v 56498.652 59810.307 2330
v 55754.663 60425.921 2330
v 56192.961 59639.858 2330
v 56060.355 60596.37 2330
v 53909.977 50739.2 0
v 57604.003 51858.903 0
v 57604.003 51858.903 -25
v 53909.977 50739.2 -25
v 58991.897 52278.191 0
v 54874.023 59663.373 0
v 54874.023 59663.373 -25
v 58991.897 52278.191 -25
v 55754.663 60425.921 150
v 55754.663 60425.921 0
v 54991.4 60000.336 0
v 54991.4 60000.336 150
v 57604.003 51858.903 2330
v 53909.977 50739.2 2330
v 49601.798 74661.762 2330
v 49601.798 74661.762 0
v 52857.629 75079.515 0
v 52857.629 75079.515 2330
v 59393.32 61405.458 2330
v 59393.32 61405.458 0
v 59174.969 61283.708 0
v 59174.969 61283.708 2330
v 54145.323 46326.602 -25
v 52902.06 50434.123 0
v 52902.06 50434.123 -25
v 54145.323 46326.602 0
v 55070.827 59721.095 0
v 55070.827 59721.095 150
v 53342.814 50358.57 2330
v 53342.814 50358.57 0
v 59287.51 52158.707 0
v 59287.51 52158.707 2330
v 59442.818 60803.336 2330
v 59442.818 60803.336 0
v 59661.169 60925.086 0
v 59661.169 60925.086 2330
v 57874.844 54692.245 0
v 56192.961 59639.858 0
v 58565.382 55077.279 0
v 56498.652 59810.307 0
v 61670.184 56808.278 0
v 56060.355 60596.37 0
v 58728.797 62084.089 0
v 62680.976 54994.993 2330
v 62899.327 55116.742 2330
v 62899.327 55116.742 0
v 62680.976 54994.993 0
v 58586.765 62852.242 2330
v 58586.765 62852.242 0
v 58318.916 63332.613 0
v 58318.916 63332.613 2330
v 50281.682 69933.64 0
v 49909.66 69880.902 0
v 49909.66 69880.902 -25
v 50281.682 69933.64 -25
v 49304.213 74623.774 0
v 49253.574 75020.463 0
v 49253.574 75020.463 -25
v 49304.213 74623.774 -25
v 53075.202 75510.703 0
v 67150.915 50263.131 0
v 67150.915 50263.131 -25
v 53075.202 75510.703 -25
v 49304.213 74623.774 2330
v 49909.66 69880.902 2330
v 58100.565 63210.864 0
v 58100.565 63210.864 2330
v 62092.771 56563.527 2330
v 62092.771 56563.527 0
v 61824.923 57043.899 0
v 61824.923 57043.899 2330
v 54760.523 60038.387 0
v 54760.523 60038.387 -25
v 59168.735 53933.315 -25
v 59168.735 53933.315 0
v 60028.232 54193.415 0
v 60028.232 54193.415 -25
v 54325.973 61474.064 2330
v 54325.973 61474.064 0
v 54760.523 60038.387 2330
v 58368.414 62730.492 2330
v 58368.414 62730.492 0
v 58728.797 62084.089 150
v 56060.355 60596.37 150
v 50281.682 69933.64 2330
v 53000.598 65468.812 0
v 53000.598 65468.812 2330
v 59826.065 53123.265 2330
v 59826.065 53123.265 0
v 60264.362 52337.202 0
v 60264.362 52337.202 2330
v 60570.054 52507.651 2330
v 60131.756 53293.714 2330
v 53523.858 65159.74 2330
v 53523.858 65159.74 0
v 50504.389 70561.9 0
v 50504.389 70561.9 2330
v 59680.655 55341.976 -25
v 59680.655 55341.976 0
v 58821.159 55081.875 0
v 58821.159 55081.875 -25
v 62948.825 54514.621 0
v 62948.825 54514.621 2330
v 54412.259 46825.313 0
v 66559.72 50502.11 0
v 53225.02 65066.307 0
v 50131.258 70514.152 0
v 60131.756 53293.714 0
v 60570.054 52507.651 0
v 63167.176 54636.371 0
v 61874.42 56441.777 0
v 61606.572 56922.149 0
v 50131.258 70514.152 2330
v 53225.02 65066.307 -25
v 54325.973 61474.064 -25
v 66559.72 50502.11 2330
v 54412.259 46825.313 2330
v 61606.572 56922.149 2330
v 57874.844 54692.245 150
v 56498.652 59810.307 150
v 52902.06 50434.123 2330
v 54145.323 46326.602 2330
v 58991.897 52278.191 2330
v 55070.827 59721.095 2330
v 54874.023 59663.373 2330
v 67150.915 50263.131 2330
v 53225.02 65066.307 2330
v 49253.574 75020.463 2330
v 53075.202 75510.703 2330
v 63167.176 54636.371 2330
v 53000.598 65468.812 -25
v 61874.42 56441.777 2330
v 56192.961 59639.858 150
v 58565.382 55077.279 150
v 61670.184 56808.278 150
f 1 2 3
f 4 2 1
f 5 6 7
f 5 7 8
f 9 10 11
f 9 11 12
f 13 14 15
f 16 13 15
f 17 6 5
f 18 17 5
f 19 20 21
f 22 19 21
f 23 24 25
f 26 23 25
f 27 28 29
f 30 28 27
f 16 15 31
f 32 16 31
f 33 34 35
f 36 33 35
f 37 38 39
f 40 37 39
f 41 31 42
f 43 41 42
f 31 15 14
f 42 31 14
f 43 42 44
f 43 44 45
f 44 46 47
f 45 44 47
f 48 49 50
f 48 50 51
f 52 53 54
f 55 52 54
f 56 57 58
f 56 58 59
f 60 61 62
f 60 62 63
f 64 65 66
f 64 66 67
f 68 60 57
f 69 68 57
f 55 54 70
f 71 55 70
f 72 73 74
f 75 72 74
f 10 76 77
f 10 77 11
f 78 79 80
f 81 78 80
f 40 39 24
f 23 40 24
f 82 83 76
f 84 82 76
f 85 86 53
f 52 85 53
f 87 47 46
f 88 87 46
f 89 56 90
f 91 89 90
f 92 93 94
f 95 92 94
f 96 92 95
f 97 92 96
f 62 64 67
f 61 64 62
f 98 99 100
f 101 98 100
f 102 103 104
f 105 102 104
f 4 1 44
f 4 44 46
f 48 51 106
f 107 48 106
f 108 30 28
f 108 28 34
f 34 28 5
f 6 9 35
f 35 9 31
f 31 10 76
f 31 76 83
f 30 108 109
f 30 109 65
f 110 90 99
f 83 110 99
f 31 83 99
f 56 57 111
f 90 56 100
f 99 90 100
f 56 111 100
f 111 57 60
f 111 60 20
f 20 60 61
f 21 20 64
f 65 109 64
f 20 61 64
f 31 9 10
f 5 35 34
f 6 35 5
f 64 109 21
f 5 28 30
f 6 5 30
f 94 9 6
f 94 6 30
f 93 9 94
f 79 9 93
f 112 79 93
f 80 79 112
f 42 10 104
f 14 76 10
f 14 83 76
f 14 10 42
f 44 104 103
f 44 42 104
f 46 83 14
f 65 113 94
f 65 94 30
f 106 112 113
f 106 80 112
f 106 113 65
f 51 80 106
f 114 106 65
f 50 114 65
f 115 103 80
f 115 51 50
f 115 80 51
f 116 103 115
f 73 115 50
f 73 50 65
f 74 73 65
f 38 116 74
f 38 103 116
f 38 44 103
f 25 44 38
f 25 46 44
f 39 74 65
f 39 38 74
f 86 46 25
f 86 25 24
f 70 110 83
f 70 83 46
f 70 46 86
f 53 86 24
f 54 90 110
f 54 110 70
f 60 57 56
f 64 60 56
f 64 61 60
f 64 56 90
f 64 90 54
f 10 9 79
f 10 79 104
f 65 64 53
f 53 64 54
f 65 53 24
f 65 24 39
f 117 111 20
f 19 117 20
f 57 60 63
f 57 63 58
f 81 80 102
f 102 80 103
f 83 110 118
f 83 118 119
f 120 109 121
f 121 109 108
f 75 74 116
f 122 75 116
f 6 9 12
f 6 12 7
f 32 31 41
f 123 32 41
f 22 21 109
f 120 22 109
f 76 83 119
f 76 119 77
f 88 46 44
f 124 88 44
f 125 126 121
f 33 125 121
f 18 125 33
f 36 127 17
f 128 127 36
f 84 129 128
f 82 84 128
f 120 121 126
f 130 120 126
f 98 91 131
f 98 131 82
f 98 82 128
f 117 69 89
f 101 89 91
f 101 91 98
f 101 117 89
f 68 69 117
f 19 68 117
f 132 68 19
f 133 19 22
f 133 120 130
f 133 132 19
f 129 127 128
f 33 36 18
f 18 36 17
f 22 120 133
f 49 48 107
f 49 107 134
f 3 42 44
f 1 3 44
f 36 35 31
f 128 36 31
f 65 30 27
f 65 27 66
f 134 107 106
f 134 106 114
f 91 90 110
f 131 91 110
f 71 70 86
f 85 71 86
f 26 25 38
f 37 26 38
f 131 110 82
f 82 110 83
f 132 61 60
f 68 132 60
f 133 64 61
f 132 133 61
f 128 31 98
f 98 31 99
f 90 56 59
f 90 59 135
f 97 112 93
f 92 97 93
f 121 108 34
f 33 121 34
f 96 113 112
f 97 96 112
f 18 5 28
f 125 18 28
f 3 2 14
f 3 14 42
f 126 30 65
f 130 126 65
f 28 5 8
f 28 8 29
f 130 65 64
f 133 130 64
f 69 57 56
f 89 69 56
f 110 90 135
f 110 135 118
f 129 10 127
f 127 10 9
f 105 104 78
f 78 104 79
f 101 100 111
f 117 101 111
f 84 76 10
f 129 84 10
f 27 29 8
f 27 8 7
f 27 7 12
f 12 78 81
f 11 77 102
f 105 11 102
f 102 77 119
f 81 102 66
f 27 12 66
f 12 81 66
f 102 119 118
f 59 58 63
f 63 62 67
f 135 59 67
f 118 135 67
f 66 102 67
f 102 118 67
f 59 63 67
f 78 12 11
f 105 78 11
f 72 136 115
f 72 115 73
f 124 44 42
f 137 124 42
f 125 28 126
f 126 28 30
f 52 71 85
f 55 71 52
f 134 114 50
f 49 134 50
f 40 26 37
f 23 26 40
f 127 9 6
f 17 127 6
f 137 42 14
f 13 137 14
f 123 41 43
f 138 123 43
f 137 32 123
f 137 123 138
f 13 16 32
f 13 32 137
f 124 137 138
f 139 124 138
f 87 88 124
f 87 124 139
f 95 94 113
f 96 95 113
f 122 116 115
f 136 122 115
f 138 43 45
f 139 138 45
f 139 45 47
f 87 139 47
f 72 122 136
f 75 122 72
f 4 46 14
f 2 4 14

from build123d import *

# Parameters (mm, degrees)
F3_DEPTH  = 2330
F5_DEPTH  = 25
F7_DEPTH  = 2330
F9_DEPTH  = 150
F11_DEPTH = 25.001


# Not quite as in the source:
# - ends of sketch curves that miss each other by under 0.0002 mm in the source are joined


with BuildPart() as f3:
    # F2 (on Top) → F3 (new body)
    with BuildSketch(Plane.XY):
        Polygon((52902.0595629306, 50434.1230428591), (54145.32292, 46326.602018), (54431.4219269024, 46413.1983883223), (67150.915474, 50263.131268), (53075.201891, 75510.702684), (49253.5741891713, 75020.4629237414), (49304.213105, 74623.774346), (49909.660074, 69880.902321), (50281.682258, 69933.639978), (53000.597675, 65468.812402), (53225.019852, 65066.306629), (54325.972768, 61474.063518), (54760.522861, 60038.387295), (54874.022799, 59663.37285), (58991.897227, 52278.191447), (57604.002801, 51858.903346), (53909.97748, 50739.1999), align=None)
        Polygon((54412.25928, 46825.31334), (53342.81403, 50358.57026), (59287.509616, 52158.706562), (55070.827017, 59721.094989), (53523.858293, 65159.740021), (50504.389213421, 70561.8996273451), (50131.257661, 70514.151722), (49601.798244, 74661.762303), (52857.629236, 75079.514646), (66559.719817, 50502.109853), align=None, mode=Mode.SUBTRACT)
    extrude(amount=F3_DEPTH)


with BuildPart() as f5:
    # F4 (on Top) → F5 (new body)
    with BuildSketch(Plane.XY):
        Polygon((54760.522861, 60038.387295), (54874.022799, 59663.37285), (58991.897227, 52278.191447), (57604.002801, 51858.903346), (53909.97748, 50739.1999), (52902.0595629306, 50434.1230428591), (54145.32292, 46326.602018), (67150.915474, 50263.131268), (53075.201891, 75510.702684), (49253.5741891713, 75020.4629237414), (49304.213105, 74623.774346), (49909.660074, 69880.902321), (50281.682258, 69933.639978), (53000.597675, 65468.812402), (53225.019852, 65066.306629), (54325.972768, 61474.063518), align=None)
    extrude(amount=-F5_DEPTH)

    # F6 (on Top) → F7 (join)
    with BuildSketch(Plane.XY):
        Polygon((63167.175561, 54636.370609), (62899.326908, 55116.742443), (62680.976074, 54994.993056), (62948.824727, 54514.621222), align=None)
        Polygon((61606.57177, 56922.149305), (61874.420423, 56441.777471), (62092.771256, 56563.526859), (61824.922604, 57043.898693), align=None)
        Polygon((60131.75578, 53293.714353), (59826.064613, 53123.26521), (60264.362406, 52337.202212), (60570.053573, 52507.651355), align=None)
        Polygon((56498.652366, 59810.307311), (56060.354571, 60596.370312), (55754.663404, 60425.921169), (56192.961199, 59639.858168), align=None)
        Polygon((59393.320264, 61405.457583), (59174.969431, 61283.708196), (59442.818085, 60803.336359), (59661.168918, 60925.085747), align=None)
        Polygon((58586.764842, 62852.241589), (58318.916189, 63332.613423), (58100.565355, 63210.864035), (58368.414008, 62730.492201), align=None)
    extrude(amount=F7_DEPTH)

    # F10 (on face) → F11 (cut, through all)
    with BuildSketch(Plane.XY):
        Polygon((59168.735458, 53933.31513), (60028.231633, 54193.415485), (59680.654869, 55341.975624), (58821.158694, 55081.875269), align=None)
    extrude(amount=-F11_DEPTH, mode=Mode.SUBTRACT)


with BuildPart() as f9:
    # F8 (on Top) → F9 (new body)
    with BuildSketch(Plane.XY):
        Polygon((58728.797232615, 62084.088870835), (56060.354571, 60596.370312), (56498.652366, 59810.307311), (56192.961199, 59639.858168), (55754.663404, 60425.921169), (54991.3996931603, 60000.3359416475), (55070.827017, 59721.094989), (55102.8168784927, 59663.7229310719), (57874.844064254, 54692.2445670372), (58565.3824039826, 55077.2791403316), (61670.1839855803, 56808.2778988538), align=None)
    extrude(amount=F9_DEPTH)


solid = Compound([f3.part, f5.part, f9.part])
